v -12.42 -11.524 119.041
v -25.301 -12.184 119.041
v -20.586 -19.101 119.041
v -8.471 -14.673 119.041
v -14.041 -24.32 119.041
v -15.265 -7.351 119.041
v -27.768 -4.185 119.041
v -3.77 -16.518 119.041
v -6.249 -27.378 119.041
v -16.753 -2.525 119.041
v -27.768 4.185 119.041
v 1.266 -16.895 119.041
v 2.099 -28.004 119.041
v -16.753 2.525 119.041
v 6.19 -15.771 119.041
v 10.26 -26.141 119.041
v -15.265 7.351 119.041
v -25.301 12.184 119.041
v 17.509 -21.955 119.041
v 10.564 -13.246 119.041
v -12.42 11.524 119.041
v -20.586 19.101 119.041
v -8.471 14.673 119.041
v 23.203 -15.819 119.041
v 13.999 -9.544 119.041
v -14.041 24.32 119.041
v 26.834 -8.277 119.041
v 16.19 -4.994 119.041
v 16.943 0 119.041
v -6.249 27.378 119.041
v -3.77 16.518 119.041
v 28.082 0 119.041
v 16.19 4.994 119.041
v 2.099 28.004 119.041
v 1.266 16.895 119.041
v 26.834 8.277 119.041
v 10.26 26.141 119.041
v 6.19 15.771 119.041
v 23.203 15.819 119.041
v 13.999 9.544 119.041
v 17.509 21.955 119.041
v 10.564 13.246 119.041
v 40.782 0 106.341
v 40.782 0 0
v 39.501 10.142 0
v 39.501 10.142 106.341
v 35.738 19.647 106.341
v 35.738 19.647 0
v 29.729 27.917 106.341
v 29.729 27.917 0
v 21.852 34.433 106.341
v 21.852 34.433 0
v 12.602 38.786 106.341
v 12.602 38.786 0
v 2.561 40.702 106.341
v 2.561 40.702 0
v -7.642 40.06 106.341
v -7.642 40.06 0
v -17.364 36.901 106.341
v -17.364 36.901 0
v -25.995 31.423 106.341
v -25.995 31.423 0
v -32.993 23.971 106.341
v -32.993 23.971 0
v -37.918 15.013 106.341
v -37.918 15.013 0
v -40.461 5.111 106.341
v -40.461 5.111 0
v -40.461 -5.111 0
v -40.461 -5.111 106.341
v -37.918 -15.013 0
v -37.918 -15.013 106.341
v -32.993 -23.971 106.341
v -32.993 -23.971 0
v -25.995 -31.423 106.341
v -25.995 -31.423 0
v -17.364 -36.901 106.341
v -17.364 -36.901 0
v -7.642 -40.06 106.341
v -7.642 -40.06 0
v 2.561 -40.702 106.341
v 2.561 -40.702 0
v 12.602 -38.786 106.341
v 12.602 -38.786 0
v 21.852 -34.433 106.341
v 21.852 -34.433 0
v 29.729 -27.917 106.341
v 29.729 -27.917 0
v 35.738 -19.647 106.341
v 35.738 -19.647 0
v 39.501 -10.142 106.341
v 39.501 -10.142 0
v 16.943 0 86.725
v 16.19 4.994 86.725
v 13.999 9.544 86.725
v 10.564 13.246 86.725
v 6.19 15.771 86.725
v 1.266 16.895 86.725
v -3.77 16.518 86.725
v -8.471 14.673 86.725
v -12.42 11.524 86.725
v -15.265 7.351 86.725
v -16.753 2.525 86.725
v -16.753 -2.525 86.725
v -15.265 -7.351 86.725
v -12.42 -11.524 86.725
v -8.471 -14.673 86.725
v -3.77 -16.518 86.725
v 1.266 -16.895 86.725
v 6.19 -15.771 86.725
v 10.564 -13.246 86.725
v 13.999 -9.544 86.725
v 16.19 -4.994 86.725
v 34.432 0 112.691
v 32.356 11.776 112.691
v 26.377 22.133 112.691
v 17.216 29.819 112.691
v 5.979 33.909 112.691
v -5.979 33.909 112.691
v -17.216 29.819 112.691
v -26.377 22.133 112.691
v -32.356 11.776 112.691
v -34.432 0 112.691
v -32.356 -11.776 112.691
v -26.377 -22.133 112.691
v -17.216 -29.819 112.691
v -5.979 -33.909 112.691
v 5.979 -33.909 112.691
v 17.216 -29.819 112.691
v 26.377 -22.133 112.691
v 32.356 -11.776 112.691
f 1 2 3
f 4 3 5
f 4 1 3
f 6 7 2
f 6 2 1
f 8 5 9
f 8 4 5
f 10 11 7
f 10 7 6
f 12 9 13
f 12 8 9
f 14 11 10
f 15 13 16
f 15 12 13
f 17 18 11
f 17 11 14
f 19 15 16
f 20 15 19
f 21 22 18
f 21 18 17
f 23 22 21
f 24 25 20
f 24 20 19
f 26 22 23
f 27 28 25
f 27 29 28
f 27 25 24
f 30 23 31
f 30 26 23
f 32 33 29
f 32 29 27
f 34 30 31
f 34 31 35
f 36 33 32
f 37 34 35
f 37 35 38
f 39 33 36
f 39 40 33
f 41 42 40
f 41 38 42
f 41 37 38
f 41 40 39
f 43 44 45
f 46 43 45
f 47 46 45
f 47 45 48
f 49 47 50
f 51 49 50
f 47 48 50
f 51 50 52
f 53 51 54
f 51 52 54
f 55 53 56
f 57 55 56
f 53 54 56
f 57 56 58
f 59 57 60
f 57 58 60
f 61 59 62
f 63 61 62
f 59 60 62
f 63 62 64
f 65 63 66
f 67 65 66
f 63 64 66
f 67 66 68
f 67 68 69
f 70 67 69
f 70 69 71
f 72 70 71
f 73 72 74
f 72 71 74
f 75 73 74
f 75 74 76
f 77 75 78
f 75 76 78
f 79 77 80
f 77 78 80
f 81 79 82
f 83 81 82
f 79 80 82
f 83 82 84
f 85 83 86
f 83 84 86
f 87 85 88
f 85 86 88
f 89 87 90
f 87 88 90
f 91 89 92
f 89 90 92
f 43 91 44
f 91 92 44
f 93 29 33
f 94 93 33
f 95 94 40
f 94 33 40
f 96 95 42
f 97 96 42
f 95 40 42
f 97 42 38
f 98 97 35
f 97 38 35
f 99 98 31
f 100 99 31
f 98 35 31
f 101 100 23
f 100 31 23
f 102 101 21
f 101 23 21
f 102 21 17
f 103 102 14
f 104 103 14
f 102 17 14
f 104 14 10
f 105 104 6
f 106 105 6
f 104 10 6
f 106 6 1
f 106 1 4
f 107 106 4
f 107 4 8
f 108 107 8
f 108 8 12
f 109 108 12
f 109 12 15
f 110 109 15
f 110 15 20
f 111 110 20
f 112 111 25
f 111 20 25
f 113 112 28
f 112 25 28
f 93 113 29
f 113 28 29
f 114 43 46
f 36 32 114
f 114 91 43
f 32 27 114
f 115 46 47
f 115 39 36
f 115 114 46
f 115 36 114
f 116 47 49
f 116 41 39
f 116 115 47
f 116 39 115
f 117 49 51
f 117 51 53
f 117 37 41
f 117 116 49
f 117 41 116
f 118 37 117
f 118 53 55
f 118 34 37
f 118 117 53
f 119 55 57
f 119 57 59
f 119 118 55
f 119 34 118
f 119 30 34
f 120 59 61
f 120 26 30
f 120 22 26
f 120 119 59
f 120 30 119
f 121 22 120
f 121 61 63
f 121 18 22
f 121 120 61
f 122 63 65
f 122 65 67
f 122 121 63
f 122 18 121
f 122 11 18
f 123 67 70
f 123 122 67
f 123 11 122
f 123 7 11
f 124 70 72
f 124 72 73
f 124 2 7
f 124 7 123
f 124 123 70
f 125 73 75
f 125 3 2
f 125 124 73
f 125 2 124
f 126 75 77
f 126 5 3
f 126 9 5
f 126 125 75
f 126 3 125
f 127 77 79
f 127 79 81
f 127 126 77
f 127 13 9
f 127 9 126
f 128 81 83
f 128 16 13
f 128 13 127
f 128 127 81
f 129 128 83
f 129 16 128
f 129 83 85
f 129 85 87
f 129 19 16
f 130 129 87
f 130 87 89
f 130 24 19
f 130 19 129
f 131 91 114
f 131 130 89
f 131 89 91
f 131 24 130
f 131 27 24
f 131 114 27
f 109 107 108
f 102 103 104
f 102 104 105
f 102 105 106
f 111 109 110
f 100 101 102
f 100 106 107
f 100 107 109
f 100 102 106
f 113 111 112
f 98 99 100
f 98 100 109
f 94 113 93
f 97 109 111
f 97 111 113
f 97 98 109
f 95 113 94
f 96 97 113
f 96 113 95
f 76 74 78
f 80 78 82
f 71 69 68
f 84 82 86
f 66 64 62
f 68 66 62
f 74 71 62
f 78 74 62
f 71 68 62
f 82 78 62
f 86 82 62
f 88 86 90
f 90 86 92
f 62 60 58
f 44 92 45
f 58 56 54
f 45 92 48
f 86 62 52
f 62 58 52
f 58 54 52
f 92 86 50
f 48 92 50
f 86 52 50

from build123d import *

# Parameters (mm, degrees)
F0_R     = 40.782092
F1_DEPTH = 119.040735
F3_R     = 16.942627
F4_DEPTH = 32.315634
F5_SIZE  = 12.7


with BuildPart() as f1:
    # F0 (on Top) → F1 (new body)
    with BuildSketch(Plane.XY):
        Circle(F0_R)
    extrude(amount=F1_DEPTH)

    # F3 (on face) → F4 (cut)
    with BuildSketch(Plane.XY.offset(119.040735)):
        Circle(F3_R)
    extrude(amount=-F4_DEPTH, mode=Mode.SUBTRACT)

    # F5
    f5_edges = [f1.edges().sort_by_distance(p)[0] for p in [
        (-40.782092, 0, 119.040735),
    ]]
    chamfer(f5_edges, length=F5_SIZE)


solid = f1.part
